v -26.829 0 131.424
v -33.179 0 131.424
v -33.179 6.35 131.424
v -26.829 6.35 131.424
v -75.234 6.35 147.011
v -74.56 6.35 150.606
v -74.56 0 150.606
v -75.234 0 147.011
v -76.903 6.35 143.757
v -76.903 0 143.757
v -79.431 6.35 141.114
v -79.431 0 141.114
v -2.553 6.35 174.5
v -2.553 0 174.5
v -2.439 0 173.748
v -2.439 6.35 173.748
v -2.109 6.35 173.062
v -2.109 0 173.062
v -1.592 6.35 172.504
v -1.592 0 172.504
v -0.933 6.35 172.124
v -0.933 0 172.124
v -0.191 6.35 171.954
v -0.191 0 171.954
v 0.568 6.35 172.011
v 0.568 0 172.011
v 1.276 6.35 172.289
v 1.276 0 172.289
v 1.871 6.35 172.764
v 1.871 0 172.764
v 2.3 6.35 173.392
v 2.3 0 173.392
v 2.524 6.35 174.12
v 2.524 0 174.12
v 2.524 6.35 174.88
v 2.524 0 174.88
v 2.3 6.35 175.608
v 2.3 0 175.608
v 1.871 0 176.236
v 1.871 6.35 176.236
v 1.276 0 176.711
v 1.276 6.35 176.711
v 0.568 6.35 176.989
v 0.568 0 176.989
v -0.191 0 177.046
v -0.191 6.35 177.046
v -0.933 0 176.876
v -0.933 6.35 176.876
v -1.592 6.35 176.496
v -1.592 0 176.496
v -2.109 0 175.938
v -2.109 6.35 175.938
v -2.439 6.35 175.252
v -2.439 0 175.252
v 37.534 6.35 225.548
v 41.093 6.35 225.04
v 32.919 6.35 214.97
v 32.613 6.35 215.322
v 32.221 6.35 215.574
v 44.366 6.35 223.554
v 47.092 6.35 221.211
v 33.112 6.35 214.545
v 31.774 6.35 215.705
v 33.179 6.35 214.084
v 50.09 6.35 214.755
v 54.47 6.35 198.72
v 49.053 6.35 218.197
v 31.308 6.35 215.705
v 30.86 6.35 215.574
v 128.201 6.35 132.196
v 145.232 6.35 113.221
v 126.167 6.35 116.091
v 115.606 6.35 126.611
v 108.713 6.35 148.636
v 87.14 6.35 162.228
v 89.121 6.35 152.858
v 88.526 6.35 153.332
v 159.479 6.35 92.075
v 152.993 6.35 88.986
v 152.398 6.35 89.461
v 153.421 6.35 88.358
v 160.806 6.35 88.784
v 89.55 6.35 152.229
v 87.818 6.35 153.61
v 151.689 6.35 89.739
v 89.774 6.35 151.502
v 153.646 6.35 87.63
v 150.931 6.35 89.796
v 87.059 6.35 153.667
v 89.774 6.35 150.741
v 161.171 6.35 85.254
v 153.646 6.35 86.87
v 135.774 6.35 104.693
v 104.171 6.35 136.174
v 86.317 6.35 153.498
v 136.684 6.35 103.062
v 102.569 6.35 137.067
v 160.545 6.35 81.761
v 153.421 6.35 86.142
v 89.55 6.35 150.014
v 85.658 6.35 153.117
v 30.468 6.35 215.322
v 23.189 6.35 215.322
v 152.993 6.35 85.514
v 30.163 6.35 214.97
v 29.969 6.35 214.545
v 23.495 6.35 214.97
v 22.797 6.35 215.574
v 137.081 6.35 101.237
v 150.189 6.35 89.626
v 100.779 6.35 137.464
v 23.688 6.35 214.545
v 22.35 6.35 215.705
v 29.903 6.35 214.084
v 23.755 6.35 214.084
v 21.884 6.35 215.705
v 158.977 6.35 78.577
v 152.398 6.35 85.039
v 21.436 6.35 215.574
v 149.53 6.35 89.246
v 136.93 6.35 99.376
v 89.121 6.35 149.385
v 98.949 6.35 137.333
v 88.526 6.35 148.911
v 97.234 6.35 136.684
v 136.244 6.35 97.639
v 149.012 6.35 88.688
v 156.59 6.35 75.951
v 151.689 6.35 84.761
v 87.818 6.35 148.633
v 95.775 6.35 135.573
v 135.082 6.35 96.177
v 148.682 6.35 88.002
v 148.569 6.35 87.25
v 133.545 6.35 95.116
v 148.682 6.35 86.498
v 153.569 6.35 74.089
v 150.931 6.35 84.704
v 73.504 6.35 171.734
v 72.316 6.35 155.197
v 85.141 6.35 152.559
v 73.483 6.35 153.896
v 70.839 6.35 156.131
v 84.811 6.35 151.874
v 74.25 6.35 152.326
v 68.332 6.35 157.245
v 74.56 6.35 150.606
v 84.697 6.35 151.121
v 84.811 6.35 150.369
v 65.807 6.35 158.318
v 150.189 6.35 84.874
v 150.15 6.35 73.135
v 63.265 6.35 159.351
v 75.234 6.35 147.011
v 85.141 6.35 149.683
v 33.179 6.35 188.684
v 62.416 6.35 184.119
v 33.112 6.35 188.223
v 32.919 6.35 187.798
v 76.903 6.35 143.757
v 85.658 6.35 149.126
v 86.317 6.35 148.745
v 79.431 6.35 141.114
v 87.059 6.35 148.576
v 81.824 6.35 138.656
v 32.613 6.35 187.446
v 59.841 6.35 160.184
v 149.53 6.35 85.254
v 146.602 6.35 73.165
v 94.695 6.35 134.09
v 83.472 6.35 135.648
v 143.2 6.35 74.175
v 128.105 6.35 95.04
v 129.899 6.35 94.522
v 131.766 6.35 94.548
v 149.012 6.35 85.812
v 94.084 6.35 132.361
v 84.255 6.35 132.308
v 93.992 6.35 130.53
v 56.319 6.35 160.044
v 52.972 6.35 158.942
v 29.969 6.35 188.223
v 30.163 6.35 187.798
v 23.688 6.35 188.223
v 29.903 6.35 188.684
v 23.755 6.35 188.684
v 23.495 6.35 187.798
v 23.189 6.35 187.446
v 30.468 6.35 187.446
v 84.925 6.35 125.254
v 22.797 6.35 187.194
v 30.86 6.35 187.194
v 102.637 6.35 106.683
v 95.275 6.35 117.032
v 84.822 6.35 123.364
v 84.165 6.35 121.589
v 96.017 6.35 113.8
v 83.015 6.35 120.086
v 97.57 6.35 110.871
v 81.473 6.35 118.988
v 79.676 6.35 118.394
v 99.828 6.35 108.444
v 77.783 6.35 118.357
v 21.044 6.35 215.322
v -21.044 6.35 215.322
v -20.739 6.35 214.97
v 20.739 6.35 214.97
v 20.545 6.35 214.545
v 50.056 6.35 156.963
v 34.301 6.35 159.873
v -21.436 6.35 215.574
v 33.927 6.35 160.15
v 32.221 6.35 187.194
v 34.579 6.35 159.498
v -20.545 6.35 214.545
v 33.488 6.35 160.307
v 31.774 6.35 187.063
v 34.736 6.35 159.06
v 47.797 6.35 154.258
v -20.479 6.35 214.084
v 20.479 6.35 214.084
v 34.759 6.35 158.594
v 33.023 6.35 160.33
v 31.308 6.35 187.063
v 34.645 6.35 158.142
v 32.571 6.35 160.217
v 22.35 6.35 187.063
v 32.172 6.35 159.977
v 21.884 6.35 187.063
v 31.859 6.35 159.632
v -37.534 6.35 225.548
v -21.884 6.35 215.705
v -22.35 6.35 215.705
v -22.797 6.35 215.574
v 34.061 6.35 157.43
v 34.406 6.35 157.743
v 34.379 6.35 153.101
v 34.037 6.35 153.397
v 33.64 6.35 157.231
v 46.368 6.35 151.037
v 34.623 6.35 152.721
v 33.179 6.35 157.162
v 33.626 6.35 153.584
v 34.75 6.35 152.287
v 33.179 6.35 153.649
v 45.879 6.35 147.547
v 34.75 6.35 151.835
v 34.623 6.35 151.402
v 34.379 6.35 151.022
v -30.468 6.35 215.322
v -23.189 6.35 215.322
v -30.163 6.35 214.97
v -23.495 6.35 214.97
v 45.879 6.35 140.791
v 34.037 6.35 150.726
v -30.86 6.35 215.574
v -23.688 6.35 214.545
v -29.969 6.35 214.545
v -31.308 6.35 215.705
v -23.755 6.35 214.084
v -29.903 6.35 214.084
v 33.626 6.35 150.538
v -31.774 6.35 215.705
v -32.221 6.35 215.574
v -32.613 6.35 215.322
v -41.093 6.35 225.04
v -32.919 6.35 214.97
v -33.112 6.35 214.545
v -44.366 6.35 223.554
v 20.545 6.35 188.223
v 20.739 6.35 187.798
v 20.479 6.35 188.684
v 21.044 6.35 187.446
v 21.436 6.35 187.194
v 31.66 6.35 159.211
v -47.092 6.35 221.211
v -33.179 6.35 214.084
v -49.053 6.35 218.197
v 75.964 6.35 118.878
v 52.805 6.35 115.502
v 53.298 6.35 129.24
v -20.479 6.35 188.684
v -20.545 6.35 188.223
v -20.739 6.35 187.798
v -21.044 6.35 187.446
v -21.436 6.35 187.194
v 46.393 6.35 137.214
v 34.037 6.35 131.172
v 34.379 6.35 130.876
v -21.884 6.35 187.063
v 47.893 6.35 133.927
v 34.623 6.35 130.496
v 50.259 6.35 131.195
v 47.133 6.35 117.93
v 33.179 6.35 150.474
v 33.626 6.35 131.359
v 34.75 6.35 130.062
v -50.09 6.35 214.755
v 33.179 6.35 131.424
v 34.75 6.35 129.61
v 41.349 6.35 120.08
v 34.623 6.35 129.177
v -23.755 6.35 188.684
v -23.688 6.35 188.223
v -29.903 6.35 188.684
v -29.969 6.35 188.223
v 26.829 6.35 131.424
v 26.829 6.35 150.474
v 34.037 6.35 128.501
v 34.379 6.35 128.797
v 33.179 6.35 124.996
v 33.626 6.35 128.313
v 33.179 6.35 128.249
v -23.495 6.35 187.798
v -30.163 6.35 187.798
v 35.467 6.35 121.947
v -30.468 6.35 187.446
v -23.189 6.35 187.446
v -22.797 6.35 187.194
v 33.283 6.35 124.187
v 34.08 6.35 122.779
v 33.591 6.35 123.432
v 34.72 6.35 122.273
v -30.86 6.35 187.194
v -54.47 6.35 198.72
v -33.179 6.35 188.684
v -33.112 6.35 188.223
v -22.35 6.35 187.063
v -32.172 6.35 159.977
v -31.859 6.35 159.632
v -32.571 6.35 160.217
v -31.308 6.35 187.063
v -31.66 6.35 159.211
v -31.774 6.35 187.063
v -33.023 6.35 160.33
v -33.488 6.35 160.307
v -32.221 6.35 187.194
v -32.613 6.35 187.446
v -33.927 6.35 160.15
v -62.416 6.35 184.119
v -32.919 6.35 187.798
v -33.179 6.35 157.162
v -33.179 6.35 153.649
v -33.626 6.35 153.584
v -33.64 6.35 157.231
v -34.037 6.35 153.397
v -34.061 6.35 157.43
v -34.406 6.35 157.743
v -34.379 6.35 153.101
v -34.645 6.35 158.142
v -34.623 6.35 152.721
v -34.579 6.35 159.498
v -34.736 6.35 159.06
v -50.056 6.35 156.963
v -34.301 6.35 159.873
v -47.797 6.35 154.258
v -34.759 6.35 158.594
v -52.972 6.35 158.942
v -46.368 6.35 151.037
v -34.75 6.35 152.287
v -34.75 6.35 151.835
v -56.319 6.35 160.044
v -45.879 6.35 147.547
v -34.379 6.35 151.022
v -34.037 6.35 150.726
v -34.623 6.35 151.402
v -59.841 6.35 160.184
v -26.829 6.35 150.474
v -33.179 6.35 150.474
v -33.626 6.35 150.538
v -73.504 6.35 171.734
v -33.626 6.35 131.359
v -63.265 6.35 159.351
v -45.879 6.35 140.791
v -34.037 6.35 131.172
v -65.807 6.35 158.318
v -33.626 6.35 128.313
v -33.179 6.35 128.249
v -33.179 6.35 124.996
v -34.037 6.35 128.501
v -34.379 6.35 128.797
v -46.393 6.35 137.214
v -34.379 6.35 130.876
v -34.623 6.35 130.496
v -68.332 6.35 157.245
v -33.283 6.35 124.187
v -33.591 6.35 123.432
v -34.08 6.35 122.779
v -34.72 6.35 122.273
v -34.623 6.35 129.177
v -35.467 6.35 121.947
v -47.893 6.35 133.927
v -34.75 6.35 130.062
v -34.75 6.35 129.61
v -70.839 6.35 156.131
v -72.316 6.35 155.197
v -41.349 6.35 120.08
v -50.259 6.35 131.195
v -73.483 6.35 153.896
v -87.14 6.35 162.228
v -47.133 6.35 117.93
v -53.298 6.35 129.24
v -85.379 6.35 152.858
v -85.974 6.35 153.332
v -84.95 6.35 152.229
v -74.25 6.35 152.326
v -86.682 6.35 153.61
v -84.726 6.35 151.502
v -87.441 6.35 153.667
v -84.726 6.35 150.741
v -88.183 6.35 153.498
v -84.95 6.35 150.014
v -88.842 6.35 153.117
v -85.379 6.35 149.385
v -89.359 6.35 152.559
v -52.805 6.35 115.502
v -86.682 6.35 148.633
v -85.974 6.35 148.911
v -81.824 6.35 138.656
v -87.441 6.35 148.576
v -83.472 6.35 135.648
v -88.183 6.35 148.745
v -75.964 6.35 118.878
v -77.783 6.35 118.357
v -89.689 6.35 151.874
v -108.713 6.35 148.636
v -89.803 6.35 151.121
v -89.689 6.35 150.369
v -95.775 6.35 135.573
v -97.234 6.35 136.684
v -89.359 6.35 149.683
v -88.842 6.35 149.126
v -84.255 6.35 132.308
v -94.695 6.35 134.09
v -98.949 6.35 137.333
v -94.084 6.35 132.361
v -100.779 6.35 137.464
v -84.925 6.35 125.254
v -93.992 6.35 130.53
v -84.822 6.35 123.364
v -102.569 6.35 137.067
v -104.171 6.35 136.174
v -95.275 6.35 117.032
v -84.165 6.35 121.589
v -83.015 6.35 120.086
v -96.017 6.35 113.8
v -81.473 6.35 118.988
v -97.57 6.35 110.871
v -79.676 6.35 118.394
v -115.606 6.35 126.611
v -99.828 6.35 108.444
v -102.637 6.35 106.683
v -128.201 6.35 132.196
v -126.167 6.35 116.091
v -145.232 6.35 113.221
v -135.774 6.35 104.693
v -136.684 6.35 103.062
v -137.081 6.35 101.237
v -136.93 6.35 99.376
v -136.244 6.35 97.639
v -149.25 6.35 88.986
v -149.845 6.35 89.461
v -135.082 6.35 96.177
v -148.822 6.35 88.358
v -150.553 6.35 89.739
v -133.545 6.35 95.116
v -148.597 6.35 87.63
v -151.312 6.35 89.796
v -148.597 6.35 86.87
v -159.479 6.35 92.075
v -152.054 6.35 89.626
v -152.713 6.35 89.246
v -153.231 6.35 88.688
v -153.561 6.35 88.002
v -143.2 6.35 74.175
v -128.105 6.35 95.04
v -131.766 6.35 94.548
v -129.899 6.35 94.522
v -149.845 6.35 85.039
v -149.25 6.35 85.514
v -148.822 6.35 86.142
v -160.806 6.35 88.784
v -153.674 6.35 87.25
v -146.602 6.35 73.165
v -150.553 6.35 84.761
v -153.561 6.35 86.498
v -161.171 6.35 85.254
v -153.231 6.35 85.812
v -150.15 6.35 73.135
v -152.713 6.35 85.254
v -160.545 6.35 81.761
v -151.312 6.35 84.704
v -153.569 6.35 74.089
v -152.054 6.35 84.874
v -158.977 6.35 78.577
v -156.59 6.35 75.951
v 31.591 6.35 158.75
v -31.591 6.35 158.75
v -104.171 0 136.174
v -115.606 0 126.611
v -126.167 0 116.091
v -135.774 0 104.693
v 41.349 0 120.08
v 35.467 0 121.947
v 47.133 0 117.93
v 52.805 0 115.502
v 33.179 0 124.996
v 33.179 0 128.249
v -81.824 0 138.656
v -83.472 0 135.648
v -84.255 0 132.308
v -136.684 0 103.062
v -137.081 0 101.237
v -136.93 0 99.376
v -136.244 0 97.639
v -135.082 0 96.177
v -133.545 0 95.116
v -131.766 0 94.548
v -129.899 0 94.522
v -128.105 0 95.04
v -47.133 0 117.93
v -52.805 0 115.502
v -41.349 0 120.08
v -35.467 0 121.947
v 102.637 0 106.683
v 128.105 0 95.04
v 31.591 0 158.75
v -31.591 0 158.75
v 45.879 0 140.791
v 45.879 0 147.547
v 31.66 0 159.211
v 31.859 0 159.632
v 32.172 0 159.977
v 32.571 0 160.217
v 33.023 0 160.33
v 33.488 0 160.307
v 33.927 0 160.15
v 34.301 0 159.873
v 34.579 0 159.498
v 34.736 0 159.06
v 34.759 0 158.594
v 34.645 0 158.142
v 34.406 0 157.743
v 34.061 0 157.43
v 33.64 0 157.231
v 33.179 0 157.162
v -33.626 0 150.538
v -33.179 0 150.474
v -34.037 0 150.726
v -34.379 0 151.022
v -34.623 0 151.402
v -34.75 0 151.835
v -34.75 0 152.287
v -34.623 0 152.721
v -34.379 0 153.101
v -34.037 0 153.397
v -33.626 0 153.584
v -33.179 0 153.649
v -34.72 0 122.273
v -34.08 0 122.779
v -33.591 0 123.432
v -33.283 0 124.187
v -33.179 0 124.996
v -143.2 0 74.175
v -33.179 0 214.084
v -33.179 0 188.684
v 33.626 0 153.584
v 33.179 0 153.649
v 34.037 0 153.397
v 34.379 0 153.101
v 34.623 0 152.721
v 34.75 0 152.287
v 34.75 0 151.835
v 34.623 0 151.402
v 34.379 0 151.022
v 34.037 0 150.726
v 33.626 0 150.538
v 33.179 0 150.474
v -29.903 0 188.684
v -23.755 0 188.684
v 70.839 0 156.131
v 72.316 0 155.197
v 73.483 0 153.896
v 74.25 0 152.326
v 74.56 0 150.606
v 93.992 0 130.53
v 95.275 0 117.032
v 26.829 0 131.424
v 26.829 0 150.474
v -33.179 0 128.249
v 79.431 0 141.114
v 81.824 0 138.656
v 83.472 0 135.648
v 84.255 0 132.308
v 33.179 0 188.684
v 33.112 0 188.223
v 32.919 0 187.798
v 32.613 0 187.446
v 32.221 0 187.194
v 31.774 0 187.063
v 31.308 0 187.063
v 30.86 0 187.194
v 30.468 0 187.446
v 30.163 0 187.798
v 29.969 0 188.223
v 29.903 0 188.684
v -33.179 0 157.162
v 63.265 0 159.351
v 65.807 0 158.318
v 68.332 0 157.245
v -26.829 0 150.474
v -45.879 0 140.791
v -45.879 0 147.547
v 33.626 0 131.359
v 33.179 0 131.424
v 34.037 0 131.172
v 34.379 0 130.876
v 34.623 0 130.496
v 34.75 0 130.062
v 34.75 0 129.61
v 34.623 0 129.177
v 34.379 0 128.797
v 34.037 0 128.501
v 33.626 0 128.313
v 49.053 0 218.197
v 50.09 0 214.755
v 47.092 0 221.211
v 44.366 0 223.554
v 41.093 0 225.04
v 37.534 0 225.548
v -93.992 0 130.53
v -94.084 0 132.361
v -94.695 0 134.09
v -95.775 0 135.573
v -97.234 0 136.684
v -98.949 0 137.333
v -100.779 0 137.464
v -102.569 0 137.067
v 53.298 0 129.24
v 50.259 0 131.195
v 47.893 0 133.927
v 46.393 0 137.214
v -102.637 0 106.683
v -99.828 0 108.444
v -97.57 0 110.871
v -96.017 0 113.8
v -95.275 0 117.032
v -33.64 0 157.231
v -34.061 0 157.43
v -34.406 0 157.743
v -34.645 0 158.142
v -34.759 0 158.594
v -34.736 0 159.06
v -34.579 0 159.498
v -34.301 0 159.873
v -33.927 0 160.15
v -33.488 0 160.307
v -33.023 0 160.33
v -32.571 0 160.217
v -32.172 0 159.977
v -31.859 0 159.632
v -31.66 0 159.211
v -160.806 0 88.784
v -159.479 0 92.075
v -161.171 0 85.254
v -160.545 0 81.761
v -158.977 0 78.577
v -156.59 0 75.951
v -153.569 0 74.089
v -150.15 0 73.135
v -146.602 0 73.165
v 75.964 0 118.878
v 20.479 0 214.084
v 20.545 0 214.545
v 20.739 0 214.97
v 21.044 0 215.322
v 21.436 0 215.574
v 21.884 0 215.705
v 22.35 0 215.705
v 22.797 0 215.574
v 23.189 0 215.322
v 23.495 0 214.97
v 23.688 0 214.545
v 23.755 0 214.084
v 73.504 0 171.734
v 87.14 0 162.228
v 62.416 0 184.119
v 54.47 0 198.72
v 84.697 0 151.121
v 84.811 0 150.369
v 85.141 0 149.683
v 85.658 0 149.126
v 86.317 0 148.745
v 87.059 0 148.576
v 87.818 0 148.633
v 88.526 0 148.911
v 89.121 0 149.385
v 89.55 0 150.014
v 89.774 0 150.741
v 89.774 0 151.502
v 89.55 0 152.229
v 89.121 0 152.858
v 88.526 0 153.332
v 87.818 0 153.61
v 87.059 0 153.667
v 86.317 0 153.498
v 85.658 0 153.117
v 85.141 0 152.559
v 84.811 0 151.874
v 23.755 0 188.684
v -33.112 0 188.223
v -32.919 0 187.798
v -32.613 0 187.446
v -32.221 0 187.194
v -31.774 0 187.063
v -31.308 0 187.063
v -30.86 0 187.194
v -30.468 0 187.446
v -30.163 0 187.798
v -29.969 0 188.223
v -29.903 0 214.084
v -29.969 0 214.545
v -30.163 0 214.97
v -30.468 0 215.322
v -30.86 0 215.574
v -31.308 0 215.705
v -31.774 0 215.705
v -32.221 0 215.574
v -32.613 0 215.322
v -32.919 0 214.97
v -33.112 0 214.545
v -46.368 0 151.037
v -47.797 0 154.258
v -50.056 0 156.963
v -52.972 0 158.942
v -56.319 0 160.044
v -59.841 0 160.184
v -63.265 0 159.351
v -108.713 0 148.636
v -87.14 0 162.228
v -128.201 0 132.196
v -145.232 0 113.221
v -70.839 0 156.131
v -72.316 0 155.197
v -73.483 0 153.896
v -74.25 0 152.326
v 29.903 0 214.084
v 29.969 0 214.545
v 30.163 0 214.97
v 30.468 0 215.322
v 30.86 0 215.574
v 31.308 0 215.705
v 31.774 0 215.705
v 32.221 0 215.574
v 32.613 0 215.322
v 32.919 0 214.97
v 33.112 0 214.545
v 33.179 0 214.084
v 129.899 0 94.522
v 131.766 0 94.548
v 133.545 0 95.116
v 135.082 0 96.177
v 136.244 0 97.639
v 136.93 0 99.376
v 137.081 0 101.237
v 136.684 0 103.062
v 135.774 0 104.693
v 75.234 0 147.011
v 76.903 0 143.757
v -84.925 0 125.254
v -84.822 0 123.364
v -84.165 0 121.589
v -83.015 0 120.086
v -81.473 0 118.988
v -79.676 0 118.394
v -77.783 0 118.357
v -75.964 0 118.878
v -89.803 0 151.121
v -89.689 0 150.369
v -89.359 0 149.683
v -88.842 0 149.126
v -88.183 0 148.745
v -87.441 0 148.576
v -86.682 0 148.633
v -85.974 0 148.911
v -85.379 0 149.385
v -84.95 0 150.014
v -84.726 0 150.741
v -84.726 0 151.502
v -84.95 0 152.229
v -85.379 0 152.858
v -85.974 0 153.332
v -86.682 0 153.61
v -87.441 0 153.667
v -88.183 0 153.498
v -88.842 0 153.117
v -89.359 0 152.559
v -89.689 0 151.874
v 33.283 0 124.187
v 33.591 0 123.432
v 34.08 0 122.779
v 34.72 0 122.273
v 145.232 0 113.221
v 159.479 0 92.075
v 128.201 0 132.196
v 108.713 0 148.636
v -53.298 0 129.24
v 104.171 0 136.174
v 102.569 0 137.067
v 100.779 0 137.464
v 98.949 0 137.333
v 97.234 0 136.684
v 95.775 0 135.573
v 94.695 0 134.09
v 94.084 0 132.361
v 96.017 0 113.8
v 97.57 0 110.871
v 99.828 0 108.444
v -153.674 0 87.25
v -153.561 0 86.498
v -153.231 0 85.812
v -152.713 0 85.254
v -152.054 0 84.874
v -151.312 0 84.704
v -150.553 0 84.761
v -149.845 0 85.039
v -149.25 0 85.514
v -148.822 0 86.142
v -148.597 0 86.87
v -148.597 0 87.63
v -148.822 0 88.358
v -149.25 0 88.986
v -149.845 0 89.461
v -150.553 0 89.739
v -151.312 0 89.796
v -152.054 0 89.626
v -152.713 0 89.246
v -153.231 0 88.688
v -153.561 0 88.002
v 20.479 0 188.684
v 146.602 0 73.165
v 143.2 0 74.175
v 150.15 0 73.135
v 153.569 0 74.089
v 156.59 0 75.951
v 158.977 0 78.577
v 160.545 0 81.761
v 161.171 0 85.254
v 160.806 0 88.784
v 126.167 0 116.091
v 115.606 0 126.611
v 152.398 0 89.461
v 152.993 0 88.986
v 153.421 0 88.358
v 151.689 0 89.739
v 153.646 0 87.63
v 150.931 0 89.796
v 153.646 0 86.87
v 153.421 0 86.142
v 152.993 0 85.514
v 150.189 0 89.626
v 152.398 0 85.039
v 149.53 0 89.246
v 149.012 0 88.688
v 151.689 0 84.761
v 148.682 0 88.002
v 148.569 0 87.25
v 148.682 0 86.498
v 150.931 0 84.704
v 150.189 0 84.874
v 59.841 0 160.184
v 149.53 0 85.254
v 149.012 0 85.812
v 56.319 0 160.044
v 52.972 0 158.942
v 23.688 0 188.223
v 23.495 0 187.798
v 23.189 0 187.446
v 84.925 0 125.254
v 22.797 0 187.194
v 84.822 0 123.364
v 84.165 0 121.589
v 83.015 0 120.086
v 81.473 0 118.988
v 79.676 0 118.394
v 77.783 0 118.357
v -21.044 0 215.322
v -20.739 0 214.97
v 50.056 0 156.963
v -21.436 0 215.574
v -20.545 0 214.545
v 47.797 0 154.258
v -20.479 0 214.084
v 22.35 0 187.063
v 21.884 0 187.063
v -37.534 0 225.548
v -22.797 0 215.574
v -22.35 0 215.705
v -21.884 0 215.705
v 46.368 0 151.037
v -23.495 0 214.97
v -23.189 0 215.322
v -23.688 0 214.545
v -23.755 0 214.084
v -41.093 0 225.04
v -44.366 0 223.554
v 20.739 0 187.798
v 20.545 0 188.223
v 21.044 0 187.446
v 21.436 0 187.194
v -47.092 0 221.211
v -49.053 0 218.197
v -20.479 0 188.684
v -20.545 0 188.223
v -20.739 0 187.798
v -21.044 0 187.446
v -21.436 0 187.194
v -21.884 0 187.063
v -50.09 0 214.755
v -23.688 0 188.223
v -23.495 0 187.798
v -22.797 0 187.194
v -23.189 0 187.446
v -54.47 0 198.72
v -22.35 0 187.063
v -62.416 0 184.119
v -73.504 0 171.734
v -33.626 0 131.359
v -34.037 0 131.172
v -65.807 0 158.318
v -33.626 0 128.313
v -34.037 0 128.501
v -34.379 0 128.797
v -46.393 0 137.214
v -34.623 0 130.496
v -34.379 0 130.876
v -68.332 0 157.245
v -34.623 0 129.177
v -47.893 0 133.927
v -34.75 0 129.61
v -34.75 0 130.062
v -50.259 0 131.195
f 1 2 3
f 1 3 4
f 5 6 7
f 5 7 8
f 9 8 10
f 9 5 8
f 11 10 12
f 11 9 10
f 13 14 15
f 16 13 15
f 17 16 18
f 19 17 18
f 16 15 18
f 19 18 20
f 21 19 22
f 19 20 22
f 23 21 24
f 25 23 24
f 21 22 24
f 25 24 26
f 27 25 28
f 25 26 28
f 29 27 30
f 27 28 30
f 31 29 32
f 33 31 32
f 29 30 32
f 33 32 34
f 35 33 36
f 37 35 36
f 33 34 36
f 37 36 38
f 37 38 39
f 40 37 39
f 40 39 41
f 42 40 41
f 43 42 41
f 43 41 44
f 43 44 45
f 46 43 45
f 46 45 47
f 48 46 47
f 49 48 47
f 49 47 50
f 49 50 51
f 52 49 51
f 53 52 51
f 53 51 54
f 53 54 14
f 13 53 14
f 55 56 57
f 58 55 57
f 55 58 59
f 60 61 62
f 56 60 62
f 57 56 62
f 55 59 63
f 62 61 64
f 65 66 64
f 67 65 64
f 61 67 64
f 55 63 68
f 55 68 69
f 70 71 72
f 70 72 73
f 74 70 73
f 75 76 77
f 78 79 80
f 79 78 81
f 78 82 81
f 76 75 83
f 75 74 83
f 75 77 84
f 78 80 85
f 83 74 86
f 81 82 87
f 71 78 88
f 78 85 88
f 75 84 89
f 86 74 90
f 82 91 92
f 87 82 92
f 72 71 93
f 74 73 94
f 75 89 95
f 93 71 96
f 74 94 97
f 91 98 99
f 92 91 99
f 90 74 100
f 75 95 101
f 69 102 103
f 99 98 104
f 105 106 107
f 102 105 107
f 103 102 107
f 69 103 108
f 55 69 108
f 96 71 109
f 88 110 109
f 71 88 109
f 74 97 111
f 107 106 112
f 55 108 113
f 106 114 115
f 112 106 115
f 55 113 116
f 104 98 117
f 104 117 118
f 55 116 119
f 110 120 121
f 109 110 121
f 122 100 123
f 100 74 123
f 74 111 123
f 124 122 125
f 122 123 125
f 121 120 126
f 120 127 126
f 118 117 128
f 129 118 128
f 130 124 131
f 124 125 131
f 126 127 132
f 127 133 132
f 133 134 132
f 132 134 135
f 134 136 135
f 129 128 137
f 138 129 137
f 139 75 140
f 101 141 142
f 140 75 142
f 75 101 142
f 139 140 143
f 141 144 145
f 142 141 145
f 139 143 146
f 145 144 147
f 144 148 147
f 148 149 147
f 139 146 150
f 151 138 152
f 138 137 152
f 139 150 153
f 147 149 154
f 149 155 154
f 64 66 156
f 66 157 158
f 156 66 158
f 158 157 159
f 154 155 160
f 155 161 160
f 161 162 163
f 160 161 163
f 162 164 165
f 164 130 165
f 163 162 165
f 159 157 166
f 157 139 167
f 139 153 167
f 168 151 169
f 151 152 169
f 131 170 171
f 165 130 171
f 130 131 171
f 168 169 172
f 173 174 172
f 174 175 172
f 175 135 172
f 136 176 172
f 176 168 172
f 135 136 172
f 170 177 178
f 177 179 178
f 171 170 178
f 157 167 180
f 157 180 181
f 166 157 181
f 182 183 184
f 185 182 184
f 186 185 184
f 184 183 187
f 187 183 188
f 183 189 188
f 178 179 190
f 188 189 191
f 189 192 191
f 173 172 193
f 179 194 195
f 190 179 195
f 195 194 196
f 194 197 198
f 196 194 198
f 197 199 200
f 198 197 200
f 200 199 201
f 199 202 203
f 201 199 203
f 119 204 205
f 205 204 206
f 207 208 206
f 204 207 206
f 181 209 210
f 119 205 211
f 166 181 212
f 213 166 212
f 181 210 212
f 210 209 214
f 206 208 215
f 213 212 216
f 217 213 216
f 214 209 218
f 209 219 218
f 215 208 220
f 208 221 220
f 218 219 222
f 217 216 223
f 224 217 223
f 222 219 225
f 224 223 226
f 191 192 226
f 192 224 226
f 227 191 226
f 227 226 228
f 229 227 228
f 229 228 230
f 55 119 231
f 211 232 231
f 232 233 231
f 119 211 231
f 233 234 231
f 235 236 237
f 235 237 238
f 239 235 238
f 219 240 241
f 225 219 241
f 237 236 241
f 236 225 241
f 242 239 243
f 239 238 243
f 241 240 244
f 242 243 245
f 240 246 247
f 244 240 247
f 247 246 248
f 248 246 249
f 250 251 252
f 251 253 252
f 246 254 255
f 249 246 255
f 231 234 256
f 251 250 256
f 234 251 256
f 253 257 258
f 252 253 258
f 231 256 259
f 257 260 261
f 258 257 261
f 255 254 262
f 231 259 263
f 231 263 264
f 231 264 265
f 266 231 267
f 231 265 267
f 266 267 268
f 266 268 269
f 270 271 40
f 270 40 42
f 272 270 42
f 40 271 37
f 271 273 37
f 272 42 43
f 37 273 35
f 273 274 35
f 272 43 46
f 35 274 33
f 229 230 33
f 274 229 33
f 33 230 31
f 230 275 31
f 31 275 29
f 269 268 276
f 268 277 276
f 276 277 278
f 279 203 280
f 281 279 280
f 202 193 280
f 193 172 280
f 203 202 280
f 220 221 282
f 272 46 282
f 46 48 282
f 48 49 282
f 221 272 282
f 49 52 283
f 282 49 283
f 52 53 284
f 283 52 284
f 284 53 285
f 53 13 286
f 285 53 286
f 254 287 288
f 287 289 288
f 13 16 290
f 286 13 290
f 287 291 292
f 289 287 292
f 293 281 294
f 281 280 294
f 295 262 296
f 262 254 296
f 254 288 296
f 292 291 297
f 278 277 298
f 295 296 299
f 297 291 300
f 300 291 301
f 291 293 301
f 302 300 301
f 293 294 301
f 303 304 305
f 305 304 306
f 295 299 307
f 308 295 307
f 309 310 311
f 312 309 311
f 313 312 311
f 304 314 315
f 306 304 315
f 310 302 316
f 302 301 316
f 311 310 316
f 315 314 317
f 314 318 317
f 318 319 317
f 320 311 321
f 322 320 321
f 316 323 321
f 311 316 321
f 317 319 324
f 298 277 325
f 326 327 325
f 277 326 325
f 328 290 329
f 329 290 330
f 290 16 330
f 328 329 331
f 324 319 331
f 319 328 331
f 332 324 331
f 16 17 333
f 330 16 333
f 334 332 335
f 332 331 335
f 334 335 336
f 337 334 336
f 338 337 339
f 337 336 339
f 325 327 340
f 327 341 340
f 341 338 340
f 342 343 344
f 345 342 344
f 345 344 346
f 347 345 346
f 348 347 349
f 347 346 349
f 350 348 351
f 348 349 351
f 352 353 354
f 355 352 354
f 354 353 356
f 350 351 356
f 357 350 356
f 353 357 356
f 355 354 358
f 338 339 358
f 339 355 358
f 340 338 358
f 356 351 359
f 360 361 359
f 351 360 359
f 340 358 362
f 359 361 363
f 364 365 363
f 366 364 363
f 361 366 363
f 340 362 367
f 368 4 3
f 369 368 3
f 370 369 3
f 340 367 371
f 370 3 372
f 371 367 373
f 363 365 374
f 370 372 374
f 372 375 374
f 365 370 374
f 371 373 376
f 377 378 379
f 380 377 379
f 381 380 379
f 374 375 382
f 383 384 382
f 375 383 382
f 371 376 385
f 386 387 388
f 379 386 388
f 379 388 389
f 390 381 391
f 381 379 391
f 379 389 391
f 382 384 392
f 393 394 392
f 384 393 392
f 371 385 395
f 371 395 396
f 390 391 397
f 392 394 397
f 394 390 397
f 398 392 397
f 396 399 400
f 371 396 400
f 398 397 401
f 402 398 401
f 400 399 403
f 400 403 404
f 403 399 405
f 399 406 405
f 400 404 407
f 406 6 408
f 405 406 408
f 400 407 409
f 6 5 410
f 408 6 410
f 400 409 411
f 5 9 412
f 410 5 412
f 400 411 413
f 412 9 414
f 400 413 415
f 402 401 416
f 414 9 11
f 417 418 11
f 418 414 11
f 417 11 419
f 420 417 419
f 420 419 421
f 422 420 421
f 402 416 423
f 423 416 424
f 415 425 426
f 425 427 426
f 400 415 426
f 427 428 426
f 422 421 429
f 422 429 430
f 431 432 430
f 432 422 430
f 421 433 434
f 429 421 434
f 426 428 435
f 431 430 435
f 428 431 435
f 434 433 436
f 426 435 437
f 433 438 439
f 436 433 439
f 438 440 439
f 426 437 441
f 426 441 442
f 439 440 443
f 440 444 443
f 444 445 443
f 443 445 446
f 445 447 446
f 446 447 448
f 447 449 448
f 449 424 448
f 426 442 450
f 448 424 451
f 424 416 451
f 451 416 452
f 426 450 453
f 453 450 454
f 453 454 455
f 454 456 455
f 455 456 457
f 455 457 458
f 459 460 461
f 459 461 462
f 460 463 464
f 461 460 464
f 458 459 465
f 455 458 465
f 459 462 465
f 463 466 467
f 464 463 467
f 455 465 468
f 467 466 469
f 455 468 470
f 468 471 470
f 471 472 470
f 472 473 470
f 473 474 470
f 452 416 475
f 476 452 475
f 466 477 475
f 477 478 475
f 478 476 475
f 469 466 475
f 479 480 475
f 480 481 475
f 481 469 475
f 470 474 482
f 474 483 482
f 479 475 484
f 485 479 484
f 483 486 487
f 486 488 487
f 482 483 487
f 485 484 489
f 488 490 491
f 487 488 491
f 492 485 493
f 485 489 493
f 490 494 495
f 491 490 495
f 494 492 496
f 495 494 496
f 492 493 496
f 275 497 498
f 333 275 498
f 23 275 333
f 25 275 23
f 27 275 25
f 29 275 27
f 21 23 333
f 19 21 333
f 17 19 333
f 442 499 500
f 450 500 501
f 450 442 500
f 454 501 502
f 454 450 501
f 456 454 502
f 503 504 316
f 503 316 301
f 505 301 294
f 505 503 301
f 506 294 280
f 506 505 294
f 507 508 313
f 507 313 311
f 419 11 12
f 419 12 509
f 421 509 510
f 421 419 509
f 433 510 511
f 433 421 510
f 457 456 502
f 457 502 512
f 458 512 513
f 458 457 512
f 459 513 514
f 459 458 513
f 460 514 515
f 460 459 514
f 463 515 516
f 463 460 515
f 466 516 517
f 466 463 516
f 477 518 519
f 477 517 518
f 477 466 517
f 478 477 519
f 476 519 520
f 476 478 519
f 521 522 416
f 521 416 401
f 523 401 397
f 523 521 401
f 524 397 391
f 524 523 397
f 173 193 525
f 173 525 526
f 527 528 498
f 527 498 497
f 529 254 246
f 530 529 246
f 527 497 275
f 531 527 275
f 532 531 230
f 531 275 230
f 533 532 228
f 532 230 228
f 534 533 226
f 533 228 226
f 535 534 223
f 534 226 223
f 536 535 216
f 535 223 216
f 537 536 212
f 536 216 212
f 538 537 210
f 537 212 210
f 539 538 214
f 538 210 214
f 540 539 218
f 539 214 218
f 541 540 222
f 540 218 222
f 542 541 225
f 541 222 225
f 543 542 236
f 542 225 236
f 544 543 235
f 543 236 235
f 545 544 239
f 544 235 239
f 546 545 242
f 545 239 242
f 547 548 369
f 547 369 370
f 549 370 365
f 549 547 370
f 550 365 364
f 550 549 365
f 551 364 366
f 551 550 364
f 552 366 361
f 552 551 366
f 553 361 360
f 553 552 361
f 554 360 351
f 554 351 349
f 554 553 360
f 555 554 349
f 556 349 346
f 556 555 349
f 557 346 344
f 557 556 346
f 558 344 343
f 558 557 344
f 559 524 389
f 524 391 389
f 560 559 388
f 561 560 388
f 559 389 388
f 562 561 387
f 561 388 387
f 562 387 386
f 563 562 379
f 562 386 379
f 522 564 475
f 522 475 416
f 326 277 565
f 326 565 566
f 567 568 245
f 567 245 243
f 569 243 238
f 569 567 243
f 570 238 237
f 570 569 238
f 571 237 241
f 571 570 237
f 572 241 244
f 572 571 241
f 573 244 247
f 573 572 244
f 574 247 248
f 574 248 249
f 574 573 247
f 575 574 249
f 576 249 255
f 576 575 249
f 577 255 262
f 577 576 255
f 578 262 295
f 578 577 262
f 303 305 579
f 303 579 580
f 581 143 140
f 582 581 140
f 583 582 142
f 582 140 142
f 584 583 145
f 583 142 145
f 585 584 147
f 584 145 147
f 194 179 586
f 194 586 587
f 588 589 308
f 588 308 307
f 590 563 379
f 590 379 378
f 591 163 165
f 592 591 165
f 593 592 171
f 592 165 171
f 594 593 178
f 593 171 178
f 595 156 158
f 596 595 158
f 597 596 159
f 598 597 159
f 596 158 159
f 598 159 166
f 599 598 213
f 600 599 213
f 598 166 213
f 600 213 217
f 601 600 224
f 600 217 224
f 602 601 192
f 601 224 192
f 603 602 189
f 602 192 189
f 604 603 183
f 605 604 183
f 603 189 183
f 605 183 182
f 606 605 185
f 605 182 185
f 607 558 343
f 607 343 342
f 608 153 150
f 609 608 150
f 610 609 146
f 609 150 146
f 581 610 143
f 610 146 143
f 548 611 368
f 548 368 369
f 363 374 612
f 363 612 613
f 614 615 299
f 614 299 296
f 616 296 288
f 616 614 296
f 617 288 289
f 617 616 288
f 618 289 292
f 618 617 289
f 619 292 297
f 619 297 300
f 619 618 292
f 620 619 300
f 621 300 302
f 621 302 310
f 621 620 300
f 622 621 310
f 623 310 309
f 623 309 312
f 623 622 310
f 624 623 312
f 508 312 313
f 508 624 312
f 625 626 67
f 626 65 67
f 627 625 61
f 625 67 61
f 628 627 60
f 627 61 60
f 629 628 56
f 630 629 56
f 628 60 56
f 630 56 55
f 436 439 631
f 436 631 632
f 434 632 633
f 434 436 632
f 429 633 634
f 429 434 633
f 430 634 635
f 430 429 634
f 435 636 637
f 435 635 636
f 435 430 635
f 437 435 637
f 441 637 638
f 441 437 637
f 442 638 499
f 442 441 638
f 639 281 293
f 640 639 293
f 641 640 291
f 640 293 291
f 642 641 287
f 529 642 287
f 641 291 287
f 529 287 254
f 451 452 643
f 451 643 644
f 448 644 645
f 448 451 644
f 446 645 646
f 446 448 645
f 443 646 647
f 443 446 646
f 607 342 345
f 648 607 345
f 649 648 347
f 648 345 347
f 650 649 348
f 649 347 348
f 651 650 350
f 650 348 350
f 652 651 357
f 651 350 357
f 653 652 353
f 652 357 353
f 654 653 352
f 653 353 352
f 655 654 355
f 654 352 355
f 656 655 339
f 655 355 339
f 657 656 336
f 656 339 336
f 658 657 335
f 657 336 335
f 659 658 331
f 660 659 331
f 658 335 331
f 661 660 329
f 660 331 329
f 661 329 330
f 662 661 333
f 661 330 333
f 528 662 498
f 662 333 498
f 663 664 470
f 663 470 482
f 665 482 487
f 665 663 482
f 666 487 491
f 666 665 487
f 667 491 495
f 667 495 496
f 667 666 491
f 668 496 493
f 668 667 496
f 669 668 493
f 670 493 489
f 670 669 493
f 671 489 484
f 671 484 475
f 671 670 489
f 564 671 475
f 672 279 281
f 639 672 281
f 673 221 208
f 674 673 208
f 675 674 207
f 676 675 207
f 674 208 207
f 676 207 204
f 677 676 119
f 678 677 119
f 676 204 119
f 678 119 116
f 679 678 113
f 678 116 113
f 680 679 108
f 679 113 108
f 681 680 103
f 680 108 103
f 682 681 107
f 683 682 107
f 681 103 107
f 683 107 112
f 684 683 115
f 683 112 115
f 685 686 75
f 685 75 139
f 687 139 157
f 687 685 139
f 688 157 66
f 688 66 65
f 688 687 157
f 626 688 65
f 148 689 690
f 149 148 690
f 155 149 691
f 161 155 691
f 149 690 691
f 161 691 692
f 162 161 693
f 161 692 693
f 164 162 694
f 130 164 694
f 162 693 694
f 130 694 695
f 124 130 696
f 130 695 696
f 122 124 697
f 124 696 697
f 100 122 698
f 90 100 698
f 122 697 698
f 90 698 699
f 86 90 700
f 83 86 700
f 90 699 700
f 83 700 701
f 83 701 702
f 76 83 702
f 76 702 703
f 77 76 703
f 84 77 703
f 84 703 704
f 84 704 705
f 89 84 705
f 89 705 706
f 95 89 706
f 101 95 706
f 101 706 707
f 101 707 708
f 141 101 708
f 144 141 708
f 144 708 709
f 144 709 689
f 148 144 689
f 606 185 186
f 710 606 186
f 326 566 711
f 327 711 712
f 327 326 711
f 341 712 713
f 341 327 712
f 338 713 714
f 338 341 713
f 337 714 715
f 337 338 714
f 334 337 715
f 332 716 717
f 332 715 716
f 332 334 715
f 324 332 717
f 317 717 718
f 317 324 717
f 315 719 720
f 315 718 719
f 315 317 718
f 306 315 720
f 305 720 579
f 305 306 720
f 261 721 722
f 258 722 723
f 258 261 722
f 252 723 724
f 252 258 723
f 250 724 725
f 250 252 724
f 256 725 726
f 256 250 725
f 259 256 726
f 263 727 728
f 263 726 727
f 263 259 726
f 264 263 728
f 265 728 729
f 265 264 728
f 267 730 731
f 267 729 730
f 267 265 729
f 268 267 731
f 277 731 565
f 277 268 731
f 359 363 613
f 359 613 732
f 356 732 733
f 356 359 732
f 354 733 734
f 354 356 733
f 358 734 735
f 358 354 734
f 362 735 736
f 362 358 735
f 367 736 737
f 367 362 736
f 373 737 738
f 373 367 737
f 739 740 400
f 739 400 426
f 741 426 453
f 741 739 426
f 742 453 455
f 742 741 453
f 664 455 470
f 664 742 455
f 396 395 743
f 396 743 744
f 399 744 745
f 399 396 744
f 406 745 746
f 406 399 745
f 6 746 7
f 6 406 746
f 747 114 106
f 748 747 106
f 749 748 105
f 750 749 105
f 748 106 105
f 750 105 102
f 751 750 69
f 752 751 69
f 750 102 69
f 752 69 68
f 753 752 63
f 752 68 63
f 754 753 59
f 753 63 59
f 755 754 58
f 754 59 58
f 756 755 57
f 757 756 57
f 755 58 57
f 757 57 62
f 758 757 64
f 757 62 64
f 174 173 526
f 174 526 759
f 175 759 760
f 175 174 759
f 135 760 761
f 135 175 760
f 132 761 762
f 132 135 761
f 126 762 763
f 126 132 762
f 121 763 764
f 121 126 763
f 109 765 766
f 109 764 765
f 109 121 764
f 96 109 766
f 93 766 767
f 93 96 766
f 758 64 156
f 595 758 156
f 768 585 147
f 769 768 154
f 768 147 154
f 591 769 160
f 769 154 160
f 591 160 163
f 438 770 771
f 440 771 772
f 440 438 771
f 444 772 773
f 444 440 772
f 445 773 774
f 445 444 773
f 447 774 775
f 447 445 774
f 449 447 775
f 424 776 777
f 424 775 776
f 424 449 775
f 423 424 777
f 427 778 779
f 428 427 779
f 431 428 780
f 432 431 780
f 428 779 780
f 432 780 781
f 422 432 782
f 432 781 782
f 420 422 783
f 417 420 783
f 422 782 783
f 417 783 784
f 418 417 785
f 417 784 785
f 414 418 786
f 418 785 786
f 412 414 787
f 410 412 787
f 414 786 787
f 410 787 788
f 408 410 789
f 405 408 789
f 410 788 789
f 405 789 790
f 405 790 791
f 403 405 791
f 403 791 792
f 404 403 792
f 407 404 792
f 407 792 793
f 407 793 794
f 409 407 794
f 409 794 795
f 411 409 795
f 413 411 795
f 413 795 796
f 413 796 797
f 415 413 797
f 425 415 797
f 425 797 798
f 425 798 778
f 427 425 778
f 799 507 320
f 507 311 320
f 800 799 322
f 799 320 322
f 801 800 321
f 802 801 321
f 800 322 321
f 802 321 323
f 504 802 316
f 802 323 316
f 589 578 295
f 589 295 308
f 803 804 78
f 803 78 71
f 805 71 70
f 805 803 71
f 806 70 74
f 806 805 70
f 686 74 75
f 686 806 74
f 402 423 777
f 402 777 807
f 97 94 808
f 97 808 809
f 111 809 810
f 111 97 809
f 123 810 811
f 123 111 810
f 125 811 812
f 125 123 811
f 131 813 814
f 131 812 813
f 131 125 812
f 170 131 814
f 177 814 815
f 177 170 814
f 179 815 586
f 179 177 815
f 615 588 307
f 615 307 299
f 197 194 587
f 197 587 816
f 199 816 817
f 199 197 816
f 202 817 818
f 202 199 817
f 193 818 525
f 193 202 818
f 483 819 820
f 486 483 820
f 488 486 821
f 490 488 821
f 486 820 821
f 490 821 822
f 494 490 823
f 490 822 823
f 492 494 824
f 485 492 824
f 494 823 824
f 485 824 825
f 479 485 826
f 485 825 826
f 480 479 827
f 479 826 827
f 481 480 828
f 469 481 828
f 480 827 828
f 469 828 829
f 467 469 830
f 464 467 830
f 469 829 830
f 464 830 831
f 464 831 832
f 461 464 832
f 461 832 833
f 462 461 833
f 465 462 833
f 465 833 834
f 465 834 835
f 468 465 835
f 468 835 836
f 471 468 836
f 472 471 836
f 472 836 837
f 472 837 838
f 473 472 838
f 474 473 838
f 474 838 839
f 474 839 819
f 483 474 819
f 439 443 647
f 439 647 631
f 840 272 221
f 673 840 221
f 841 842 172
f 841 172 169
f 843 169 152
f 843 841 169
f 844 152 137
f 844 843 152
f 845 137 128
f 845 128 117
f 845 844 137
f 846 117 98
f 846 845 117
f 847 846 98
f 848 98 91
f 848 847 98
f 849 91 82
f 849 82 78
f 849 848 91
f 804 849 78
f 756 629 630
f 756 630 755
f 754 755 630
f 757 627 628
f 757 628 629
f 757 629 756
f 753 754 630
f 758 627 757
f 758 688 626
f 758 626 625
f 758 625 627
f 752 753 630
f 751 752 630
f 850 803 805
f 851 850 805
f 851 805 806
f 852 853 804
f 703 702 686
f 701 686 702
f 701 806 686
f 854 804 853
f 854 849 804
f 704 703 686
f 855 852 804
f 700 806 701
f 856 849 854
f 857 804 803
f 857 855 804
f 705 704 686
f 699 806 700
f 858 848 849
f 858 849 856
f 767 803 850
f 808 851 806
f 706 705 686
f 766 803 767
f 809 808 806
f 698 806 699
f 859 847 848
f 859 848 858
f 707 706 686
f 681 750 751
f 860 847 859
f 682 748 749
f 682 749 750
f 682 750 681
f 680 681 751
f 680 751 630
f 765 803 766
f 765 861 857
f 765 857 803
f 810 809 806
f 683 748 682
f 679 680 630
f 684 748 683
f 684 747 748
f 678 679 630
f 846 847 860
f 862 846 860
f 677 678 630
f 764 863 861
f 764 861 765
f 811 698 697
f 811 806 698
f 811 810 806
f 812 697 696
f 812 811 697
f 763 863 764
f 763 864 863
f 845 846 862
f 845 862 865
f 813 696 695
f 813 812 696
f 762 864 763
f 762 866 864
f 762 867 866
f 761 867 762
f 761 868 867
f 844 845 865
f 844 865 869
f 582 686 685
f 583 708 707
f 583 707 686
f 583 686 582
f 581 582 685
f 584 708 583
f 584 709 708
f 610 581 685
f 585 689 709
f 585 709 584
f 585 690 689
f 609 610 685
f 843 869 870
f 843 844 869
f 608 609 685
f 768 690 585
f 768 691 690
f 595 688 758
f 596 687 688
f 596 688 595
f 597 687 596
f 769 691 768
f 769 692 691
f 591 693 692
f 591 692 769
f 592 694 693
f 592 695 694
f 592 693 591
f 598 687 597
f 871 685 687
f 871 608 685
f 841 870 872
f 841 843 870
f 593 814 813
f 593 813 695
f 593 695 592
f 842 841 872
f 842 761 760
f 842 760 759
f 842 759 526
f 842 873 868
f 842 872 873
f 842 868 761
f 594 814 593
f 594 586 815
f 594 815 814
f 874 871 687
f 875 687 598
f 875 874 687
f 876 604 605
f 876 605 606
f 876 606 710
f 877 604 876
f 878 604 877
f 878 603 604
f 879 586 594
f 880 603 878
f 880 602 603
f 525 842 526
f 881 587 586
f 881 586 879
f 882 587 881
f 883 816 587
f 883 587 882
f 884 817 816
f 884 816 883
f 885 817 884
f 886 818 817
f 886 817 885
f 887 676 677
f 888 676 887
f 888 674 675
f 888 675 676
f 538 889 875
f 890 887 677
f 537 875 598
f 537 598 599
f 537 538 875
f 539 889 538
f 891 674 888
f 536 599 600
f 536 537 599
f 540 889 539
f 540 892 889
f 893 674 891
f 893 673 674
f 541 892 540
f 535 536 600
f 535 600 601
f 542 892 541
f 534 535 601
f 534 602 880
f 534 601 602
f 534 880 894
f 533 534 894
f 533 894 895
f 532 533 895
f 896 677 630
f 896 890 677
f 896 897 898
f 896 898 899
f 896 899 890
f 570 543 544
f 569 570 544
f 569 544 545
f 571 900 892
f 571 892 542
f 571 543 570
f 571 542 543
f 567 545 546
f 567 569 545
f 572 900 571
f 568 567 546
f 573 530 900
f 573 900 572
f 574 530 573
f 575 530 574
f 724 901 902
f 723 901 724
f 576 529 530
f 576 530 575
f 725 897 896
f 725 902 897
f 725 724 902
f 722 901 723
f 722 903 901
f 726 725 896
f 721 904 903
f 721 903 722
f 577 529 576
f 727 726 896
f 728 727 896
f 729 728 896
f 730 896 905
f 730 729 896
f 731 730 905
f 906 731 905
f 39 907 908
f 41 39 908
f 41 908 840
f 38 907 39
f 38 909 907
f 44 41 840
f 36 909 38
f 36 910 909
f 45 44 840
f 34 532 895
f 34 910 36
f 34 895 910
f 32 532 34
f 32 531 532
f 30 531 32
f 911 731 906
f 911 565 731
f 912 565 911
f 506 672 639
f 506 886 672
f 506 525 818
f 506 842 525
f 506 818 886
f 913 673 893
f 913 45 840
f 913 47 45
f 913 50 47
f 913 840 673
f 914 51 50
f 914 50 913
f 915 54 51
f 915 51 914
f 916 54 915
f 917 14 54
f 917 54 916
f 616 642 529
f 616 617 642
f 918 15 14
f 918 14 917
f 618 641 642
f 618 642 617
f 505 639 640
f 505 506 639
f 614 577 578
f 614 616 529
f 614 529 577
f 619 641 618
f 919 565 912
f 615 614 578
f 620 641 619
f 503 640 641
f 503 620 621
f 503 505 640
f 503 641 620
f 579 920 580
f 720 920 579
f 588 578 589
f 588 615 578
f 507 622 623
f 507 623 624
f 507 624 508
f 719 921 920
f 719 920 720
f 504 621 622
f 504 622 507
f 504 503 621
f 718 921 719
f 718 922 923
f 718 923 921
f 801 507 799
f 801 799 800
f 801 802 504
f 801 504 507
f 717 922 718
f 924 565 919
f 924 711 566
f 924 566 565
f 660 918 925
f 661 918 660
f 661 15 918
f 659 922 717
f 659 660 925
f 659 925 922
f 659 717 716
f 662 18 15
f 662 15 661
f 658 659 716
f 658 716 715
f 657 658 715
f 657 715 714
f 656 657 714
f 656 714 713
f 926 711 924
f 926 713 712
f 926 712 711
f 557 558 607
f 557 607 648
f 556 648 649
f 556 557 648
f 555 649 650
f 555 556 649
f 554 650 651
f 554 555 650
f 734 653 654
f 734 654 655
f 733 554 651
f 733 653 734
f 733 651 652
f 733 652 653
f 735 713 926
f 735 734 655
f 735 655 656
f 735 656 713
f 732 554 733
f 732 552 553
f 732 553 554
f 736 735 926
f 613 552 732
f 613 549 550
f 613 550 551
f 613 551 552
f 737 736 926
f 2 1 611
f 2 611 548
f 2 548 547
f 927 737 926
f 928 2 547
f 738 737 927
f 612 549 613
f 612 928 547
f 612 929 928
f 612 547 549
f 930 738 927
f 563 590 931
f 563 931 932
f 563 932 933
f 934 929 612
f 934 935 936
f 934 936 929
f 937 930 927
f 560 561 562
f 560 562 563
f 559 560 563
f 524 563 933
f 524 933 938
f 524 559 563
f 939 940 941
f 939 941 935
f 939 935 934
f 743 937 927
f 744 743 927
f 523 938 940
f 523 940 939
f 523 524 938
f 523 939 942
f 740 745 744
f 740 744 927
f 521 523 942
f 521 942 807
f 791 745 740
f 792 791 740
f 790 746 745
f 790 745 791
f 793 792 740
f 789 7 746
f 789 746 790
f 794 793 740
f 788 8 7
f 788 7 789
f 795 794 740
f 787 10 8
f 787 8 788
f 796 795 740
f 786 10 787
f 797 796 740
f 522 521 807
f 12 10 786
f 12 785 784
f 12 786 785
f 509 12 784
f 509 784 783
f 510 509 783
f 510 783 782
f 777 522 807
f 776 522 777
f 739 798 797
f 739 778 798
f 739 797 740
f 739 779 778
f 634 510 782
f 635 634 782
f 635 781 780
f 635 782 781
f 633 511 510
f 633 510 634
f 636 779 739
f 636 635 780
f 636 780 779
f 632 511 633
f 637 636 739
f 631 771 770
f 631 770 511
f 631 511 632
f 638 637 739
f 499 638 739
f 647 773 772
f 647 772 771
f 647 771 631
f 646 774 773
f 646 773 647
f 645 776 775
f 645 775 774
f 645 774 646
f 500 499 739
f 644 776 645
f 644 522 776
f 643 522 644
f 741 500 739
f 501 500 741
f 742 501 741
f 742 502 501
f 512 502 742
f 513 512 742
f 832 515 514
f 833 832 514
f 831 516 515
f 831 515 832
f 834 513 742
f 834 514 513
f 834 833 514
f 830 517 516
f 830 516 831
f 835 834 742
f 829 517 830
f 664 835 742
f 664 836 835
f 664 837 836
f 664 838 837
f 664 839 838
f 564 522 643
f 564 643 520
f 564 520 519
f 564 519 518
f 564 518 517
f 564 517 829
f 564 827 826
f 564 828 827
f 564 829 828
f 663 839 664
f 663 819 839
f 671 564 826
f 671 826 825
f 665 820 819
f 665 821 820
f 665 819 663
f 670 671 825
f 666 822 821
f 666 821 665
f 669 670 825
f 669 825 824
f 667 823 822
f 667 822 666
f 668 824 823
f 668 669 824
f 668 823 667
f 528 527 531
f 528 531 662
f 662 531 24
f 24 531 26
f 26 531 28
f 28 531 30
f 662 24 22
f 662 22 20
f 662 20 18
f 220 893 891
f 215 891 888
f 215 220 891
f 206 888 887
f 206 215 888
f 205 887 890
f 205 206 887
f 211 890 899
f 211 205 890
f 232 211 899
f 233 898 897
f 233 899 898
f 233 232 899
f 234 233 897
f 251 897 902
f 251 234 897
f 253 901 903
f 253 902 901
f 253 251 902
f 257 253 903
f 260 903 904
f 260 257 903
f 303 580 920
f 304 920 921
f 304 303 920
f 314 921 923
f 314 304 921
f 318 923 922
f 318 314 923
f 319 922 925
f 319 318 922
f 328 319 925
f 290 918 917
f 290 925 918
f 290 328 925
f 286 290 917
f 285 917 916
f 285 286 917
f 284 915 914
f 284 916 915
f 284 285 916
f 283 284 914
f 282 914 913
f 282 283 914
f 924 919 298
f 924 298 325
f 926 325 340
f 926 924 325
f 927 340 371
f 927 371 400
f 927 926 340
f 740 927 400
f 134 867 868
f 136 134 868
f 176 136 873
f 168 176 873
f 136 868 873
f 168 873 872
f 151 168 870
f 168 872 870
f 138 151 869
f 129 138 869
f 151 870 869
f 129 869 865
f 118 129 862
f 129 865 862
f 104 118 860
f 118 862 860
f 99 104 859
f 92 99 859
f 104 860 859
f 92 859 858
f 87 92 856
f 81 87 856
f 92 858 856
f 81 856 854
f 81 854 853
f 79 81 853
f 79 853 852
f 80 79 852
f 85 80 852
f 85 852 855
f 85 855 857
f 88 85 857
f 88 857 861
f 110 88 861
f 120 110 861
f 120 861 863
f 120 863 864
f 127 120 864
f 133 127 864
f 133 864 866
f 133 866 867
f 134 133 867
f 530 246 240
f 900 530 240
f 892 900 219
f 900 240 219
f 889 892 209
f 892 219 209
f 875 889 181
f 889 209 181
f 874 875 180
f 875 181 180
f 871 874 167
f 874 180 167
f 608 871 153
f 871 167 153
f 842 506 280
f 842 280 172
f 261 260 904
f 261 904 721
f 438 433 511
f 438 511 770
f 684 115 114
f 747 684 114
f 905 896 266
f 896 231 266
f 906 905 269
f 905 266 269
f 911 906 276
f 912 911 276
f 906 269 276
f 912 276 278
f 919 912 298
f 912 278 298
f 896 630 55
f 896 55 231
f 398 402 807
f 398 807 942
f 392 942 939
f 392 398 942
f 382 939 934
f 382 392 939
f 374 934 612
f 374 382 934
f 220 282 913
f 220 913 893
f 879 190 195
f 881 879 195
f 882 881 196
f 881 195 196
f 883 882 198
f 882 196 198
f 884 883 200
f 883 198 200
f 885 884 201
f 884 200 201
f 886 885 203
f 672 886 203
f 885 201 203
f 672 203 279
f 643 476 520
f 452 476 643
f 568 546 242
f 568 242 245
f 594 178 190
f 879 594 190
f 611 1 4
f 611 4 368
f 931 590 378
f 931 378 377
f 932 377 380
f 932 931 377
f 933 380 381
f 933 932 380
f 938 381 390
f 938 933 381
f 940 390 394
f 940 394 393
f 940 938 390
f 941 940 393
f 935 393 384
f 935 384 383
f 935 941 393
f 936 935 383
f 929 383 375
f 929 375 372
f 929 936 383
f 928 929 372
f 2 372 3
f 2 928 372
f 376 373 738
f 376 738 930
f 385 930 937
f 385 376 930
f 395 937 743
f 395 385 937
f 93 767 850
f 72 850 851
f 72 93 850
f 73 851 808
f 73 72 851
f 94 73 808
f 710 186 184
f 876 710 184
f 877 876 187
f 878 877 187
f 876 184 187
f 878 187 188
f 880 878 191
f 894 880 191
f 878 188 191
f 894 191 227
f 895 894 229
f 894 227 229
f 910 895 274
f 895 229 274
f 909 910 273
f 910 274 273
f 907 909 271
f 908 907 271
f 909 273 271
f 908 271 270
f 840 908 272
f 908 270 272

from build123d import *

# Parameters (mm, degrees)
BOSS_EXTRUDE1_DEPTH    = 6.35
FILLET4_R              = 3.175
F_10_CLEARANCE_HOLE1_D = 5.1054
CUT_EXTRUDE1_DEPTH     = 278.292988553
FILLET5_R              = 12.7
SKETCH5_R              = 1.5875
CUT_EXTRUDE2_DEPTH     = 278.292988553
CUT_EXTRUDE3_DEPTH     = 278.292988553


with BuildPart() as part:
    # Sketch1 → Boss-Extrude1 (new body)
    with BuildSketch(Plane(origin=(0, 0, 0), x_dir=(1, 0, 0), z_dir=(0, 1, 0))):
        with BuildLine():
            Line((33.17875, -158.75), (33.17875, -153.648789236))
            ThreePointArc((33.17875, -153.648789236), (34.76625, -152.061289236), (33.17875, -150.473789236))
            Line((33.17875, -150.473789236), (26.82875, -150.473789236))
            Line((26.82875, -150.473789236), (26.82875, -131.423789236))
            Line((26.82875, -131.423789236), (33.17875, -131.423789236))
            ThreePointArc((33.17875, -131.423789236), (34.76625, -129.836289236), (33.17875, -128.248789236))
            Line((33.17875, -128.248789236), (33.17875, -122.589438976))
            ThreePointArc((33.17875, -122.589438976), (43.137840894, -119.449264054), (52.805287488, -115.501522126))
            Line((52.805287488, -115.501522126), (143.19952673, -74.174847787))
            ThreePointArc((143.19952673, -74.174847787), (157.875678173, -77.180277992), (159.478578107, -92.075))
            ThreePointArc((159.478578107, -92.075), (128.201088688, -132.195700986), (87.13986874, -162.227820598))
            ThreePointArc((87.13986874, -162.227820598), (59.463291006, -188.659212722), (49.275, -225.54837334))
            Line((49.275, -225.54837334), (-49.275, -225.54837334))
            ThreePointArc((-49.275, -225.54837334), (-59.463291006, -188.659212722), (-87.13986874, -162.227820598))
            ThreePointArc((-87.13986874, -162.227820598), (-128.201088688, -132.195700986), (-159.478578107, -92.075))
            ThreePointArc((-159.478578107, -92.075), (-157.875678173, -77.180277992), (-143.19952673, -74.174847787))
            Line((-143.19952673, -74.174847787), (-52.805287488, -115.501522126))
            ThreePointArc((-52.805287488, -115.501522126), (-43.137840894, -119.449264054), (-33.17875, -122.589438976))
            Line((-33.17875, -122.589438976), (-33.17875, -128.248789236))
            ThreePointArc((-33.17875, -128.248789236), (-34.76625, -129.836289236), (-33.17875, -131.423789236))
            Line((-33.17875, -131.423789236), (-26.82875, -131.423789236))
            Line((-26.82875, -131.423789236), (-26.82875, -150.473789236))
            Line((-26.82875, -150.473789236), (-33.17875, -150.473789236))
            ThreePointArc((-33.17875, -150.473789236), (-34.76625, -152.061289236), (-33.17875, -153.648789236))
            Line((-33.17875, -153.648789236), (-33.17875, -158.75))
            Line((-33.17875, -158.75), (33.17875, -158.75))
        make_face()
    extrude(amount=BOSS_EXTRUDE1_DEPTH)

    # Fillet4
    fillet4_edges = [part.edges().sort_by_distance(p)[0] for p in [
        (33.17875, 3.175, 122.589438976),
        (-33.17875, 3.175, 122.589438976),
    ]]
    fillet(fillet4_edges, radius=FILLET4_R)

    # #10 Clearance Hole1 (through all)
    with Locations(Plane(origin=(0, 6.35, 0), x_dir=(1, 0, 0), z_dir=(0, 1, 0))):
        with Locations((-151.12143296, -87.25), (-87.25, -151.12143296), (87.25, -151.12143296), (151.12143296, -87.25), (0, -174.5)):
            Hole(F_10_CLEARANCE_HOLE1_D / 2)

    # Sketch4 → Cut-Extrude1 (cut, through all)
    with BuildSketch(Plane(origin=(0, 6.35, 0), x_dir=(1, 0, 0), z_dir=(0, 1, 0))):
        with BuildLine():
            Line((-23.754817001, -214.08399668), (-29.902682999, -214.08399668))
            ThreePointArc((-29.902682999, -214.08399668), (-31.540716499, -215.722030181), (-33.17875, -214.08399668))
            Line((-33.17875, -214.08399668), (-33.17875, -188.68399668))
            ThreePointArc((-33.17875, -188.68399668), (-31.540716499, -187.045963179), (-29.902682999, -188.68399668))
            Line((-29.902682999, -188.68399668), (-23.754817001, -188.68399668))
            ThreePointArc((-23.754817001, -188.68399668), (-22.116783501, -187.045963179), (-20.47875, -188.68399668))
            Line((-20.47875, -188.68399668), (-20.47875, -214.08399668))
            ThreePointArc((-20.47875, -214.08399668), (-22.116783501, -215.722030181), (-23.754817001, -214.08399668))
        make_face()
        with BuildLine():
            Line((23.754817001, -214.08399668), (29.902682999, -214.08399668))
            ThreePointArc((29.902682999, -214.08399668), (31.540716499, -215.722030181), (33.17875, -214.08399668))
            Line((33.17875, -214.08399668), (33.17875, -188.68399668))
            ThreePointArc((33.17875, -188.68399668), (31.540716499, -187.045963179), (29.902682999, -188.68399668))
            Line((29.902682999, -188.68399668), (23.754817001, -188.68399668))
            ThreePointArc((23.754817001, -188.68399668), (22.116783501, -187.045963179), (20.47875, -188.68399668))
            Line((20.47875, -188.68399668), (20.47875, -214.08399668))
            ThreePointArc((20.47875, -214.08399668), (22.116783501, -215.722030181), (23.754817001, -214.08399668))
        make_face()
    extrude(amount=-CUT_EXTRUDE1_DEPTH, mode=Mode.SUBTRACT)

    # Fillet5
    fillet5_edges = [part.edges().sort_by_distance(p)[0] for p in [
        (-49.275, 3.175, 225.54837334),
        (49.275, 3.175, 225.54837334),
    ]]
    fillet(fillet5_edges, radius=FILLET5_R)

    # Sketch5 → Cut-Extrude2 (cut, through all)
    with BuildSketch(Plane(origin=(0, 6.35, 0), x_dir=(1, 0, 0), z_dir=(0, 1, 0))):
        with Locations((33.17875, -158.75)):
            Circle(SKETCH5_R)
        with Locations((-33.17875, -158.75)):
            Circle(SKETCH5_R)
    extrude(amount=-CUT_EXTRUDE2_DEPTH, mode=Mode.SUBTRACT)

    # Sketch6 → Cut-Extrude3 (cut, through all)
    with BuildSketch(Plane(origin=(0, 6.35, 0), x_dir=(1, 0, 0), z_dir=(0, 1, 0))):
        with BuildLine():
            Line((-128.104892872, -95.040170045), (-102.637452085, -106.683441126))
            ThreePointArc((-102.637452085, -106.683441126), (-97.569832685, -110.871132479), (-95.274991225, -117.031589274))
            Line((-95.274991225, -117.031589274), (-93.991682853, -130.529758616))
            ThreePointArc((-93.991682853, -130.529758616), (-97.23388696, -136.684180208), (-104.171376798, -136.174251443))
            ThreePointArc((-104.171376798, -136.174251443), (-121.000806478, -121.465663179), (-135.773817141, -104.692755619))
            ThreePointArc((-135.773817141, -104.692755619), (-135.716998993, -96.865146197), (-128.104892872, -95.040170045))
        make_face()
        with BuildLine():
            Line((75.963518128, -118.878299904), (53.298221251, -129.240479515))
            ThreePointArc((53.298221251, -129.240479515), (47.89341624, -133.926693904), (45.87875, -140.790631728))
            Line((45.87875, -140.790631728), (45.87875, -147.546916431))
            ThreePointArc((45.87875, -147.546916431), (51.445237892, -158.054199858), (63.26505, -159.350669746))
            ThreePointArc((63.26505, -159.350669746), (67.071533898, -157.786285337), (70.839373095, -156.130988979))
            ThreePointArc((70.839373095, -156.130988979), (73.48252349, -153.895611155), (74.56046174, -150.606050825))
            ThreePointArc((74.56046174, -150.606050825), (75.950573651, -145.323764103), (79.430821218, -141.113913629))
            ThreePointArc((79.430821218, -141.113913629), (82.749836121, -137.208085982), (84.254632043, -132.308398362))
            Line((84.254632043, -132.308398362), (84.925277307, -125.254378043))
            ThreePointArc((84.925277307, -125.254378043), (82.285012932, -119.479301937), (75.963518128, -118.878299904))
        make_face()
        with BuildLine():
            Line((93.991682853, -130.529758616), (95.274991225, -117.031589274))
            ThreePointArc((95.274991225, -117.031589274), (97.569832685, -110.871132479), (102.637452085, -106.683441126))
            Line((102.637452085, -106.683441126), (128.104892872, -95.040170045))
            ThreePointArc((128.104892872, -95.040170045), (135.716998993, -96.865146197), (135.773817141, -104.692755619))
            ThreePointArc((135.773817141, -104.692755619), (121.000806478, -121.465663179), (104.171376798, -136.174251443))
            ThreePointArc((104.171376798, -136.174251443), (97.23388696, -136.684180208), (93.991682853, -130.529758616))
        make_face()
        with BuildLine():
            Line((-45.87875, -140.790631728), (-45.87875, -147.546916431))
            ThreePointArc((-45.87875, -147.546916431), (-51.445237892, -158.054199858), (-63.26505, -159.350669746))
            ThreePointArc((-63.26505, -159.350669746), (-67.071533898, -157.786285337), (-70.839373095, -156.130988979))
            ThreePointArc((-70.839373095, -156.130988979), (-73.48252349, -153.895611155), (-74.56046174, -150.606050825))
            ThreePointArc((-74.56046174, -150.606050825), (-75.950573651, -145.323764103), (-79.430821218, -141.113913629))
            ThreePointArc((-79.430821218, -141.113913629), (-82.749836121, -137.208085982), (-84.254632043, -132.308398362))
            Line((-84.254632043, -132.308398362), (-84.925277307, -125.254378043))
            ThreePointArc((-84.925277307, -125.254378043), (-82.285012932, -119.479301937), (-75.963518128, -118.878299904))
            Line((-75.963518128, -118.878299904), (-53.298221251, -129.240479515))
            ThreePointArc((-53.298221251, -129.240479515), (-47.89341624, -133.926693904), (-45.87875, -140.790631728))
        make_face()
    extrude(amount=-CUT_EXTRUDE3_DEPTH, mode=Mode.SUBTRACT)


solid = part.part
